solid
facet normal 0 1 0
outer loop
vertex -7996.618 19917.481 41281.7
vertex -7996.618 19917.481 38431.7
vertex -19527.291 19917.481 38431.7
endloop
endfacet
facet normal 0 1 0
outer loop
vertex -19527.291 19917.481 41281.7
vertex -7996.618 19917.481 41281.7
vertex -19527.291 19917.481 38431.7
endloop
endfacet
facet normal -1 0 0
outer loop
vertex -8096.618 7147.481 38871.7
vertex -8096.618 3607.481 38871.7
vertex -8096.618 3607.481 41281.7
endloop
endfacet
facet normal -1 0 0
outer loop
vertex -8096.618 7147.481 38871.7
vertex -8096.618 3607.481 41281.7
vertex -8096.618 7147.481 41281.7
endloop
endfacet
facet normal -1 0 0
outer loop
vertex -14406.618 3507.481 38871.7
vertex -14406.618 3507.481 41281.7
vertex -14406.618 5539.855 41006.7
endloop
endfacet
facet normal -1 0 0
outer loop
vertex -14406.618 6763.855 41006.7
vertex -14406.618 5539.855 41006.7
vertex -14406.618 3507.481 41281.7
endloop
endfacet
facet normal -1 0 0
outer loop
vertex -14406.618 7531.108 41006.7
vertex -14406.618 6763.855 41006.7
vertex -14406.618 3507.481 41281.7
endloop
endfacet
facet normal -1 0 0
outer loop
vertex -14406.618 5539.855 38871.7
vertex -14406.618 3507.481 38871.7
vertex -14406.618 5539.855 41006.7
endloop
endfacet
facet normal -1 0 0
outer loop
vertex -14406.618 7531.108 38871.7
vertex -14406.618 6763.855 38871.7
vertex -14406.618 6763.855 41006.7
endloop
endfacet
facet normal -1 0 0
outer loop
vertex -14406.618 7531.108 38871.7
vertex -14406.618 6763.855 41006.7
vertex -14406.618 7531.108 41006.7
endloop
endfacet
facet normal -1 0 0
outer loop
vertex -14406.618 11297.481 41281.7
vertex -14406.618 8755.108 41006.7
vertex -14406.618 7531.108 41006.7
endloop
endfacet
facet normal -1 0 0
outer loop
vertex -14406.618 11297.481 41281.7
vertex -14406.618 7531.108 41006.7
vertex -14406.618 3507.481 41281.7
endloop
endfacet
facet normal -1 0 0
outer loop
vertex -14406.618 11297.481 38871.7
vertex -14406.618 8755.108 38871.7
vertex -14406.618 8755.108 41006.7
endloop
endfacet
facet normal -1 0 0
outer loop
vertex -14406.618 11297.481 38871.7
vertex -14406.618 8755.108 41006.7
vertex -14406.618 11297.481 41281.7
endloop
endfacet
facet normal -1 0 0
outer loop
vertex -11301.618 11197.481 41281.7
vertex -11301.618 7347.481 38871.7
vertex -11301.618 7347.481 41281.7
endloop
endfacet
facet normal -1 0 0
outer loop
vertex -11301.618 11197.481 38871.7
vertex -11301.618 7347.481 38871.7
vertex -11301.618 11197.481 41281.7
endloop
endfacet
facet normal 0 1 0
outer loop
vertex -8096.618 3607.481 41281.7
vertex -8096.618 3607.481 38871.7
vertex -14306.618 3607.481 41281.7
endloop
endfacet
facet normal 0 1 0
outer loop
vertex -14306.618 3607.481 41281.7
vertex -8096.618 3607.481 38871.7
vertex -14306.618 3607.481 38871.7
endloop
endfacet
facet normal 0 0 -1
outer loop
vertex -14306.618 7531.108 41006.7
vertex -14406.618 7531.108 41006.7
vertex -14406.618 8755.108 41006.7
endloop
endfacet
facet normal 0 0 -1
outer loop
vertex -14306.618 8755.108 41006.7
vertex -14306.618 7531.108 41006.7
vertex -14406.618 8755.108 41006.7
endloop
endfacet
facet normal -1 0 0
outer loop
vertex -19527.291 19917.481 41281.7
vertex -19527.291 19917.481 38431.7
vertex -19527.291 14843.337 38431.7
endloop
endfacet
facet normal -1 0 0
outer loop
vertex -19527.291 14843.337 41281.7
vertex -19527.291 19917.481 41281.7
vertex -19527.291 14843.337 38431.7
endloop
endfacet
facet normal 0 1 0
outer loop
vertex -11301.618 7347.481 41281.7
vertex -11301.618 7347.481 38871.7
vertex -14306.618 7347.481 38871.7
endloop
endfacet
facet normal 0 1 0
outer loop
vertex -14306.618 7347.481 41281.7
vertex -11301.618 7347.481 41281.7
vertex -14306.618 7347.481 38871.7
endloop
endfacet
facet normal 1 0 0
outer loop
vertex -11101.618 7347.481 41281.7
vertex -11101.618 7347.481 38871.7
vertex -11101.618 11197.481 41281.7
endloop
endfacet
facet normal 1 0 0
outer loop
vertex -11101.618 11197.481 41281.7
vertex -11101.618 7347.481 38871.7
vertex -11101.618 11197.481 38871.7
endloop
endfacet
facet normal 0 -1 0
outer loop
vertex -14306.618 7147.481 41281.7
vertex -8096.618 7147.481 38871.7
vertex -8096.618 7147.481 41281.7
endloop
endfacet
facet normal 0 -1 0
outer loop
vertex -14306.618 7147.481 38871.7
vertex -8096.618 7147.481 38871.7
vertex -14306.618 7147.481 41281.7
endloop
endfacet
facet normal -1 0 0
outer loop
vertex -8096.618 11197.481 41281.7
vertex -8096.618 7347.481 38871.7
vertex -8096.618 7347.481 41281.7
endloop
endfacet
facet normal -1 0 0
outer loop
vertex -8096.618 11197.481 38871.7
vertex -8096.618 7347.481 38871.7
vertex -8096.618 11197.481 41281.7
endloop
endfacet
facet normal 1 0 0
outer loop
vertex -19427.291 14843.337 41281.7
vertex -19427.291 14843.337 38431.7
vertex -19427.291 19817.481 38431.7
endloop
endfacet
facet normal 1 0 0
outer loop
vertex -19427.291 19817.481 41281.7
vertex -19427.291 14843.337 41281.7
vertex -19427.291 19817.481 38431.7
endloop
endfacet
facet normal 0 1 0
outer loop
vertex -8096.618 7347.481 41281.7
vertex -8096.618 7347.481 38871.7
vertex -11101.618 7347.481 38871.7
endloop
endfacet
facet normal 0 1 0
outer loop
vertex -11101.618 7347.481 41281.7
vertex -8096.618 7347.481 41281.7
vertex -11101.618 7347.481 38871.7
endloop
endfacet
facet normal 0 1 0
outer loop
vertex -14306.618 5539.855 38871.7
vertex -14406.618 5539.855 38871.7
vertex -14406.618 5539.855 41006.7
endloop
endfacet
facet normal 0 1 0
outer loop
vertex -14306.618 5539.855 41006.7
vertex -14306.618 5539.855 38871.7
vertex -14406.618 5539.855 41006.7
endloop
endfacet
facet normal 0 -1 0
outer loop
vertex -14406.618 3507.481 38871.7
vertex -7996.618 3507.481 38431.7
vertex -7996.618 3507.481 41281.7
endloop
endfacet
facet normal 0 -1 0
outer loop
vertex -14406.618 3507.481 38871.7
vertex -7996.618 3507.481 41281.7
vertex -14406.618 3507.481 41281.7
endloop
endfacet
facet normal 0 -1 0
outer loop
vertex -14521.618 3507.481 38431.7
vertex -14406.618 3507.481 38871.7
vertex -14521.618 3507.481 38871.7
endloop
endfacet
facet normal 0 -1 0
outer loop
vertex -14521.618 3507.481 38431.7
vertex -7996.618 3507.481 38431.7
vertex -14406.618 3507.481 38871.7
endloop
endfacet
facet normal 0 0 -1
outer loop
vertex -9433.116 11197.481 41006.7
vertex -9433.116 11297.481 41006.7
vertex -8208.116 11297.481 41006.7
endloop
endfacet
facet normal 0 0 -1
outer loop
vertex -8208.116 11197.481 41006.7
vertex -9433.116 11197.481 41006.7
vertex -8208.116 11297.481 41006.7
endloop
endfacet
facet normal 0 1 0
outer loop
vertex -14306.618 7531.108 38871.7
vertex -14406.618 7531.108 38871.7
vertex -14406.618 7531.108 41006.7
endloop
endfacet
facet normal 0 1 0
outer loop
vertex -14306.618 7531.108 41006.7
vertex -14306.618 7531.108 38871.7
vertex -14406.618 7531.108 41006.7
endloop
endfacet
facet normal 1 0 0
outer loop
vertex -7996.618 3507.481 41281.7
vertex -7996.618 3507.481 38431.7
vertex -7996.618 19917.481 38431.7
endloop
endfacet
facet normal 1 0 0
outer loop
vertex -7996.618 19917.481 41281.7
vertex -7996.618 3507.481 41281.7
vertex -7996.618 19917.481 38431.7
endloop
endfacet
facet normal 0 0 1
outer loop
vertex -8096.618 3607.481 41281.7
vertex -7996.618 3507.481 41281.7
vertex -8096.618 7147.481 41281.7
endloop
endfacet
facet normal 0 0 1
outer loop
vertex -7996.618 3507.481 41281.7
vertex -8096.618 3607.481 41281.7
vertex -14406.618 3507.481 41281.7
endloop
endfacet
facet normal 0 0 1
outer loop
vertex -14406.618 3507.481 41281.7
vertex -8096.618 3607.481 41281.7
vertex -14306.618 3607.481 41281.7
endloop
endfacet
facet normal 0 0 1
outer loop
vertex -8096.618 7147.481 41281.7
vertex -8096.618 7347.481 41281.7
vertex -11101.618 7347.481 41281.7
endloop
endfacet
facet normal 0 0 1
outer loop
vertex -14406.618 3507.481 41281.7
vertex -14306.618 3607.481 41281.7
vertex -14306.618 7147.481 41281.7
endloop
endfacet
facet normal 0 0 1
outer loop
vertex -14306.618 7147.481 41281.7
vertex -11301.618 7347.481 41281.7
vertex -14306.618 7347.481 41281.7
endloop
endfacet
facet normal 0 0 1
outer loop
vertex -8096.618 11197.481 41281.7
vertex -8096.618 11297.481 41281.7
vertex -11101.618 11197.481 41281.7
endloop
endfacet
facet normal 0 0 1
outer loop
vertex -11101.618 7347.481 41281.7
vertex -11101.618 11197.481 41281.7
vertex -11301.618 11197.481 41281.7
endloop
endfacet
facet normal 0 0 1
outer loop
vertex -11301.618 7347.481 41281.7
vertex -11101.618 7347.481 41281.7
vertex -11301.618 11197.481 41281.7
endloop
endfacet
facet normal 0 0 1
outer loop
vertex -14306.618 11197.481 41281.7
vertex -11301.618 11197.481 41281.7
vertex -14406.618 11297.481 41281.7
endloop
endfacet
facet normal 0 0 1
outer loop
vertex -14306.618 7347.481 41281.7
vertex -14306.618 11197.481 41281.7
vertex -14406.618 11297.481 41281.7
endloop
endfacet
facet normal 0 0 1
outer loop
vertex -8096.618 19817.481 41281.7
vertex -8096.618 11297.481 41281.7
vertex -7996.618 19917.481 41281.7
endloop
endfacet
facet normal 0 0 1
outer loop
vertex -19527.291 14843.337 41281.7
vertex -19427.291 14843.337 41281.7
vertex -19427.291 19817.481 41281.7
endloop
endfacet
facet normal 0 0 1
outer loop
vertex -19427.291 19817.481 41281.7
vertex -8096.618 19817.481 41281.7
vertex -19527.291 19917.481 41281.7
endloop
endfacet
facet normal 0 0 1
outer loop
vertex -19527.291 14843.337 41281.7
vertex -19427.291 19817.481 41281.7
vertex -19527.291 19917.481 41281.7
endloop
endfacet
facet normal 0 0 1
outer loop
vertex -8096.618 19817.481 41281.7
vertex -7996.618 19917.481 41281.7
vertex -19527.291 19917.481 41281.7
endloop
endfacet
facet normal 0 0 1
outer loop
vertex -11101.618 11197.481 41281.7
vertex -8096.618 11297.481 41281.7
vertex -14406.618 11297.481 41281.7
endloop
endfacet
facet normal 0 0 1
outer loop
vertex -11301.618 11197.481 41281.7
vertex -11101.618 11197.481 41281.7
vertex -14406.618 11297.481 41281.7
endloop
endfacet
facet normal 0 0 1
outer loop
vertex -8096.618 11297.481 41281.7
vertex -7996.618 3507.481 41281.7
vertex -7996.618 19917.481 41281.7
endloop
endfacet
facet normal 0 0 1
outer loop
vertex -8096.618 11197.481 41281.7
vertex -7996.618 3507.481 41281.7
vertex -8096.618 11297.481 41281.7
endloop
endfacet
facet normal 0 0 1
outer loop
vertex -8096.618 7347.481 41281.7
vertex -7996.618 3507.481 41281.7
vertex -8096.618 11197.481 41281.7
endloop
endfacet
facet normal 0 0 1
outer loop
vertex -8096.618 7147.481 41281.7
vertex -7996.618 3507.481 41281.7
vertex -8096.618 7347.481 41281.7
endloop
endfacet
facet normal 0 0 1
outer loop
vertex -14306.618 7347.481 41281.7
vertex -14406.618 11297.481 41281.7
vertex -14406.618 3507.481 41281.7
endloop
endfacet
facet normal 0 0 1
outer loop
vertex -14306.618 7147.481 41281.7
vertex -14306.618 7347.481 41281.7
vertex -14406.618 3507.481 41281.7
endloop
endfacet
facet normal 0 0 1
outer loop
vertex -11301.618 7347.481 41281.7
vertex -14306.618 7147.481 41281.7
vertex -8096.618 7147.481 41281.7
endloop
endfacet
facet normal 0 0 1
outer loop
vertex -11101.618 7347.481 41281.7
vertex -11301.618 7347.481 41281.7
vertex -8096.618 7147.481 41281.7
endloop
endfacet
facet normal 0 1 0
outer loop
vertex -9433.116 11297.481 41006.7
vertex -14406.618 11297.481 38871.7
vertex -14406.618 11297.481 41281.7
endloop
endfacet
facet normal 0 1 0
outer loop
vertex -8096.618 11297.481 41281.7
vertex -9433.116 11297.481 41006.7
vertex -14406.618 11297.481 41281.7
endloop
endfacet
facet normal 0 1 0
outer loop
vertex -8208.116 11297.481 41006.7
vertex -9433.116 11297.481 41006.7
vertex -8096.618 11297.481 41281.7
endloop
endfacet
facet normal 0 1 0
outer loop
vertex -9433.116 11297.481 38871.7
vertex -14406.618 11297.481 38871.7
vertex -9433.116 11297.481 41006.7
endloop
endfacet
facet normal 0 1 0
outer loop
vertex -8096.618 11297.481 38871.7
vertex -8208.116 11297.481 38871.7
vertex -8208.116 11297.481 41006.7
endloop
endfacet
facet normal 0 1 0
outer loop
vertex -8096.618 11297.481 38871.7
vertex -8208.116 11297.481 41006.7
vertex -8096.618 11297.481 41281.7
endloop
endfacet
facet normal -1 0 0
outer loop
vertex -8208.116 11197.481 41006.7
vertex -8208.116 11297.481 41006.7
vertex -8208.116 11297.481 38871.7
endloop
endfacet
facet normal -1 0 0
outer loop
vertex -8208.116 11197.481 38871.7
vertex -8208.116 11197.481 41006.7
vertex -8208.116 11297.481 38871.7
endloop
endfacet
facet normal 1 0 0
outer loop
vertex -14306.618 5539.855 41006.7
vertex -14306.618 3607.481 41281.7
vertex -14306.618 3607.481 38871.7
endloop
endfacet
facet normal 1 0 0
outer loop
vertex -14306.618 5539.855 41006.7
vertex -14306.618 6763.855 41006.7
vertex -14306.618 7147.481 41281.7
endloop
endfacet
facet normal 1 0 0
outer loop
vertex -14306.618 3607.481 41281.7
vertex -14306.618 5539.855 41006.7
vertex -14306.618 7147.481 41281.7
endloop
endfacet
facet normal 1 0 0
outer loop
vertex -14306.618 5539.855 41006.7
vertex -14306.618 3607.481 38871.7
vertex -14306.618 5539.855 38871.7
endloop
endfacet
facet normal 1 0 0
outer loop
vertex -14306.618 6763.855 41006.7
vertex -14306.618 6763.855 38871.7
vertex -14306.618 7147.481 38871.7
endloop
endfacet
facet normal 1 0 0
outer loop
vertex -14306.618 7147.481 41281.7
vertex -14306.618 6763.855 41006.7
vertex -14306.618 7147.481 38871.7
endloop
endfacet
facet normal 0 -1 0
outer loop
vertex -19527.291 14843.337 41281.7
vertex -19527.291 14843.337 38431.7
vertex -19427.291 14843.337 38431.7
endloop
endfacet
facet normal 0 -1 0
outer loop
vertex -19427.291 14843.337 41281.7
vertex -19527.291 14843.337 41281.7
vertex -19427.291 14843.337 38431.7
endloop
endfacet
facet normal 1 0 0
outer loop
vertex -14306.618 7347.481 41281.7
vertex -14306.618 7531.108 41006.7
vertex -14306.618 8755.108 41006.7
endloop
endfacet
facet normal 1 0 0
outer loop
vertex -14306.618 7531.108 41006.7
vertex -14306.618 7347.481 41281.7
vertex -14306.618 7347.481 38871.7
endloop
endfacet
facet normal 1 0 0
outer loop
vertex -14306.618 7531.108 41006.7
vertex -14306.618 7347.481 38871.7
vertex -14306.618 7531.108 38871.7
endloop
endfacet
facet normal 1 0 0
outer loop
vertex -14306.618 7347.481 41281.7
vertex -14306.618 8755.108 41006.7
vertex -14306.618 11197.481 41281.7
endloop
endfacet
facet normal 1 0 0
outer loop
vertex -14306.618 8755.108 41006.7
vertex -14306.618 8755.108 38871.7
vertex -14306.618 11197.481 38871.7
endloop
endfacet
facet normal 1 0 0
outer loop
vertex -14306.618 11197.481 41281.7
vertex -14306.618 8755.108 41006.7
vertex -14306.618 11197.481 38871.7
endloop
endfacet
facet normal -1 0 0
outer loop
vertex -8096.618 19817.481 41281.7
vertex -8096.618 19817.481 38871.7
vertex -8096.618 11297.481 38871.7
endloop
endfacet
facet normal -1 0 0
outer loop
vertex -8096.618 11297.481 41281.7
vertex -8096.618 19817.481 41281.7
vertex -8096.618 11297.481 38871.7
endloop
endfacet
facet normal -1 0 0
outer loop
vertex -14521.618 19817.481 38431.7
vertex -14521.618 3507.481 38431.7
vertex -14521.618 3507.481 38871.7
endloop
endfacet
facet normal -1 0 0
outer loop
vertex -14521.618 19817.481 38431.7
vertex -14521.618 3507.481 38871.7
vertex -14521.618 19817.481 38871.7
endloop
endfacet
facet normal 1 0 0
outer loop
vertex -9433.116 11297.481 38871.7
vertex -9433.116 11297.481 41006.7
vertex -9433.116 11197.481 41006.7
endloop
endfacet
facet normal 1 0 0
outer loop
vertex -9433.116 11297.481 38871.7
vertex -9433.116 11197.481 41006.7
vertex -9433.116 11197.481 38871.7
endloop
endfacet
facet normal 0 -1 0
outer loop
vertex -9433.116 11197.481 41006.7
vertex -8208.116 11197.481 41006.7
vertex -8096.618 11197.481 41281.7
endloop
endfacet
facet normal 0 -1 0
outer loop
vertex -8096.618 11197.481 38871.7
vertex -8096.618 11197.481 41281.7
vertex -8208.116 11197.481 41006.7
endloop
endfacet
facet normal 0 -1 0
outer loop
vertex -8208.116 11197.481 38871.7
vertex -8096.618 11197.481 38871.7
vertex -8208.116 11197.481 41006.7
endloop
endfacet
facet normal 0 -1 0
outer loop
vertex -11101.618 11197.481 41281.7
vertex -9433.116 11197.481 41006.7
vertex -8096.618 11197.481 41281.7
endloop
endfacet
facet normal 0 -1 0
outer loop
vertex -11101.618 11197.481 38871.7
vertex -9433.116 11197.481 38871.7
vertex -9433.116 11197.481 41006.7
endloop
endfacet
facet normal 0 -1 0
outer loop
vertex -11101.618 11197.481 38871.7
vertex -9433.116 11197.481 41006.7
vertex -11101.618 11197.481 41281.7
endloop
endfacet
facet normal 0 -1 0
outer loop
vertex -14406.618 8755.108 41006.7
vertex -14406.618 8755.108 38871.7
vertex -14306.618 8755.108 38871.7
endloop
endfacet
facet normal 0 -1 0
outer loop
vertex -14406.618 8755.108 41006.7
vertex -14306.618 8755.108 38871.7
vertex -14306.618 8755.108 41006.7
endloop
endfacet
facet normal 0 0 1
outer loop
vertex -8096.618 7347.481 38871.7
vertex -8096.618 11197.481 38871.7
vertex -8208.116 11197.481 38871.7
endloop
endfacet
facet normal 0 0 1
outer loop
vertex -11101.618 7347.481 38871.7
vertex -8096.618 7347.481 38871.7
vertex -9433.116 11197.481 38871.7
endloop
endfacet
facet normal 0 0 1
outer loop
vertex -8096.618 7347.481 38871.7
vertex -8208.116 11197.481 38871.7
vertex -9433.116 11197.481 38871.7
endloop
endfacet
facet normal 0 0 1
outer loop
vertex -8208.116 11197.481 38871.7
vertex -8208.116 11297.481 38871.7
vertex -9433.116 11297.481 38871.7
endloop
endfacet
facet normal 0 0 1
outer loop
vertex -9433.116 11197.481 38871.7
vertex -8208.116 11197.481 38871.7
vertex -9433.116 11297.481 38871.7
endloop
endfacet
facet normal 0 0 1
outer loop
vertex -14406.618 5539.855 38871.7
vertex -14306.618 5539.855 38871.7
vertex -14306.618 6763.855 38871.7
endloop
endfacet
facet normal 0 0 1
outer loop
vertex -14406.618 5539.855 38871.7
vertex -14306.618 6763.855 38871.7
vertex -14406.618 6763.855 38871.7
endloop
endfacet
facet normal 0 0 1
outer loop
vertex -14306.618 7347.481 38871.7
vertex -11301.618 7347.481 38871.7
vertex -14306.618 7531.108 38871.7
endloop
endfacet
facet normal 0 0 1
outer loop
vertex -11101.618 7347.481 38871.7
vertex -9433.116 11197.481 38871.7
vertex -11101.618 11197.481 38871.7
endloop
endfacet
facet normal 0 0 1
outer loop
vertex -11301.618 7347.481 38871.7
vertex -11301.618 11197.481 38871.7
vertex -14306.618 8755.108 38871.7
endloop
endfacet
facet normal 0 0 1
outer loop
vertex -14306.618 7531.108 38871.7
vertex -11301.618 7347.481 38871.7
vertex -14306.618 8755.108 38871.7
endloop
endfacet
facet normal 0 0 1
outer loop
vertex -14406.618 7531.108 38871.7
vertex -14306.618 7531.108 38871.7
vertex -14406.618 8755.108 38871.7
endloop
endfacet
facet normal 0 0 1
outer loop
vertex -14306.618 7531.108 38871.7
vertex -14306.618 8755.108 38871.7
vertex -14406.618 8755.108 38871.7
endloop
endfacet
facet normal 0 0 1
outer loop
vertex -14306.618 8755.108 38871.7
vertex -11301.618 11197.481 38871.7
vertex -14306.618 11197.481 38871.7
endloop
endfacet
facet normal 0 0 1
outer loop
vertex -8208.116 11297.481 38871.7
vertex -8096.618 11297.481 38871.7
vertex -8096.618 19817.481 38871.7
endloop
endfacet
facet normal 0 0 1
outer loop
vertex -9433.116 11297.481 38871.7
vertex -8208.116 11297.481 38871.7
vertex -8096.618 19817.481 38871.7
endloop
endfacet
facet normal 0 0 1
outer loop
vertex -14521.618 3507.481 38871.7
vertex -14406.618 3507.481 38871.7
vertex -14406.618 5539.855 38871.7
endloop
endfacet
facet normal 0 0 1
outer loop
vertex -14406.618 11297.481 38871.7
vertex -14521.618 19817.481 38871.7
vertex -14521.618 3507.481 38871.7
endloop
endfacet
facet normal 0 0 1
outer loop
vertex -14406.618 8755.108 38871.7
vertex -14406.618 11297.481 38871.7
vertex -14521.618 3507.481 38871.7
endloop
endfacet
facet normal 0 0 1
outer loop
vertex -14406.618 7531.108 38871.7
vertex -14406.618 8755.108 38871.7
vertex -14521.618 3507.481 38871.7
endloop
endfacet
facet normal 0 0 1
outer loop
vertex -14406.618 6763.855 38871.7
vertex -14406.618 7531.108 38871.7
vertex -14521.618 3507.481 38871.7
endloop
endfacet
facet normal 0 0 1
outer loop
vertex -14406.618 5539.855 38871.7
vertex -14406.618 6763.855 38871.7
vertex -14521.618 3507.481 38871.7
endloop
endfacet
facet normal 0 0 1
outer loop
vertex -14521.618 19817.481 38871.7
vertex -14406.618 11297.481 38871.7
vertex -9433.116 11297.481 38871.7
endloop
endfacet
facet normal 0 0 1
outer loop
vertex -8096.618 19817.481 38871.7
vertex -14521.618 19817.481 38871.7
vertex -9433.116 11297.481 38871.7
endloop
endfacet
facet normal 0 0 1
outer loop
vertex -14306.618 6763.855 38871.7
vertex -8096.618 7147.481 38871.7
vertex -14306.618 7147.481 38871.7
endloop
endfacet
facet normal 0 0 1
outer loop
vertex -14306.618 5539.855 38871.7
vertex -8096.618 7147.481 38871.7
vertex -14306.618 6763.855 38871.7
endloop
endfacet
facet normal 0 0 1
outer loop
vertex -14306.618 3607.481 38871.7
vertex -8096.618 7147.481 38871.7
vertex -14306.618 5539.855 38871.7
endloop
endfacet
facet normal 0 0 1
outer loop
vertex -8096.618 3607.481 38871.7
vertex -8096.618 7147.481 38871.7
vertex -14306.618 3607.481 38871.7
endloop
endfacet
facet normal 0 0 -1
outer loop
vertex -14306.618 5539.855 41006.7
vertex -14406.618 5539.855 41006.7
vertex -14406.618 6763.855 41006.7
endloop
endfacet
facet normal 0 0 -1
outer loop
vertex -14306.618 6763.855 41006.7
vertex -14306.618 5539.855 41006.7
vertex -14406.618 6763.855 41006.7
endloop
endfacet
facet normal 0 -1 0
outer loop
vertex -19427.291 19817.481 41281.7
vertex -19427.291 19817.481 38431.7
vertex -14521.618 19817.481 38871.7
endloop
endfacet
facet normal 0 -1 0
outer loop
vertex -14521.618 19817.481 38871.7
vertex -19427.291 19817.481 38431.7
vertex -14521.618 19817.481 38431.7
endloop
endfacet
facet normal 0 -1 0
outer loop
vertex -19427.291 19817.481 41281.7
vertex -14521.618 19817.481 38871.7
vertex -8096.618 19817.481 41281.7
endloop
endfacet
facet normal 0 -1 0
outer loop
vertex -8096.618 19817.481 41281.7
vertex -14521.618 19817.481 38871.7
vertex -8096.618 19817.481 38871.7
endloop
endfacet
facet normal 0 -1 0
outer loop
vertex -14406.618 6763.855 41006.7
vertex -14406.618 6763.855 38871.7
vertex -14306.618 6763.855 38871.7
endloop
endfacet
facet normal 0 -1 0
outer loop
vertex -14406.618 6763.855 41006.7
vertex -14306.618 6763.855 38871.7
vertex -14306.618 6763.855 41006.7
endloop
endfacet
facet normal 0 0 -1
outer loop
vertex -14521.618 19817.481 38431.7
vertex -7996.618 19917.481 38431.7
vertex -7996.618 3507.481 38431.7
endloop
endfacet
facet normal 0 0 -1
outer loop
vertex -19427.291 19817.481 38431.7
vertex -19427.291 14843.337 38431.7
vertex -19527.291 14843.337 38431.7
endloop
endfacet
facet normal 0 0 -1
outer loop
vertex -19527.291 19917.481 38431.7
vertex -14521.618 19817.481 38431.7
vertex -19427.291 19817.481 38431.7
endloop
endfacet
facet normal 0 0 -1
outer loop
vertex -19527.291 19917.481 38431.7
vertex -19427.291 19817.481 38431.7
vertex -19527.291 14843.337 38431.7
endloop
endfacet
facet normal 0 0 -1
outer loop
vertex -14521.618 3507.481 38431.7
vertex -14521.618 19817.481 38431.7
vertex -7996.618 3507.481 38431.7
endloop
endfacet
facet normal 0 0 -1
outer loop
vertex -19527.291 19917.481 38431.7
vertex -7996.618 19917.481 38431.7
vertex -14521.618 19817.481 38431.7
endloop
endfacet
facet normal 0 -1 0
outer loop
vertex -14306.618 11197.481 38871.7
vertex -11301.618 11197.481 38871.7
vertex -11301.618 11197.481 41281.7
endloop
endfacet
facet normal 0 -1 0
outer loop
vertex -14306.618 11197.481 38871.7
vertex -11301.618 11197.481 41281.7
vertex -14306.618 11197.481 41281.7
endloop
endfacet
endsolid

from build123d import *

# Parameters (mm, degrees)
SKETCH1_W           = 6525
SKETCH1_H           = 16410
BOSS_EXTRUDE1_DEPTH = 440
SKETCH2_W           = 3205
SKETCH2_H           = 4050
SKETCH2_W_2         = 3005
SKETCH2_H_2         = 3850
SKETCH2_W_3         = 6410
SKETCH2_H_3         = 3740
SKETCH2_W_4         = 6210
SKETCH2_H_4         = 3540
BOSS_EXTRUDE2_DEPTH = 2850
SKETCH6_W           = 2135
SKETCH6_H           = 1224
CUT_EXTRUDE2_DEPTH  = 1036
SKETCH7_W           = 1225
SKETCH7_H           = 2135
CUT_EXTRUDE3_DEPTH  = 1036


with BuildPart() as part:
    # Sketch1 → Boss-Extrude1 (new body)
    with BuildSketch(Plane(origin=(0, 0, 38431.700196057), x_dir=(-1, 0, 0), z_dir=(0, 0, -1))):
        with Locations((11259.117683291, 11712.481366586)):
            Rectangle(SKETCH1_W, SKETCH1_H)
    extrude(amount=-BOSS_EXTRUDE1_DEPTH)

    # Sketch2 → Boss-Extrude2 (add)
    with BuildSketch(Plane(origin=(0, 0, 38431.700196057), x_dir=(-1, 0, 0), z_dir=(0, 0, -1))):
        with Locations((12804.117683291, 9272.481366586)):
            Rectangle(SKETCH2_W, SKETCH2_H)
        with Locations((12804.117683291, 9272.481366586)):
            Rectangle(SKETCH2_W_2, SKETCH2_H_2, mode=Mode.SUBTRACT)
        with Locations((11201.617683291, 5377.481366586)):
            Rectangle(SKETCH2_W_3, SKETCH2_H_3)
        with Locations((11201.617683291, 5377.481366586)):
            Rectangle(SKETCH2_W_4, SKETCH2_H_4, mode=Mode.SUBTRACT)
        Polygon((7996.617683291, 11297.481366586), (7996.617683291, 7247.481366586), (11201.617683291, 7247.481366586), (11201.617683291, 11297.481366586), (8096.617683291, 11297.481366586), align=None)
        with Locations((9599.117683291, 9272.481366586)):
            Rectangle(SKETCH2_W_2, SKETCH2_H_2, mode=Mode.SUBTRACT)
        Polygon((7996.617683291, 11297.481366586), (7996.617683291, 19917.481366586), (19527.290870624, 19917.481366586), (19527.290870624, 14843.336774649), (19427.290870624, 14843.336774649), (19427.290870624, 19817.481366586), (8096.617683291, 19817.481366586), (8096.617683291, 11297.481366586), align=None)
    extrude(amount=-BOSS_EXTRUDE2_DEPTH)

    # Sketch6 → Cut-Extrude2 (cut)
    with BuildSketch(Plane.ZY.offset(14406.617683291)):
        with Locations((39939.200196057, 8143.108207073)):
            Rectangle(SKETCH6_W, SKETCH6_H)
        with Locations((39939.200196057, 6151.854526099)):
            Rectangle(SKETCH6_W, SKETCH6_H)
    extrude(amount=-CUT_EXTRUDE2_DEPTH, mode=Mode.SUBTRACT)

    # Sketch7 → Cut-Extrude3 (cut)
    with BuildSketch(Plane(origin=(0, 11297.481366586, 0), x_dir=(1, 0, 0), z_dir=(0, 1, 0))):
        with Locations((-8820.615695145, -39939.200196057)):
            Rectangle(SKETCH7_W, SKETCH7_H)
    extrude(amount=-CUT_EXTRUDE3_DEPTH, mode=Mode.SUBTRACT)


solid = part.part
